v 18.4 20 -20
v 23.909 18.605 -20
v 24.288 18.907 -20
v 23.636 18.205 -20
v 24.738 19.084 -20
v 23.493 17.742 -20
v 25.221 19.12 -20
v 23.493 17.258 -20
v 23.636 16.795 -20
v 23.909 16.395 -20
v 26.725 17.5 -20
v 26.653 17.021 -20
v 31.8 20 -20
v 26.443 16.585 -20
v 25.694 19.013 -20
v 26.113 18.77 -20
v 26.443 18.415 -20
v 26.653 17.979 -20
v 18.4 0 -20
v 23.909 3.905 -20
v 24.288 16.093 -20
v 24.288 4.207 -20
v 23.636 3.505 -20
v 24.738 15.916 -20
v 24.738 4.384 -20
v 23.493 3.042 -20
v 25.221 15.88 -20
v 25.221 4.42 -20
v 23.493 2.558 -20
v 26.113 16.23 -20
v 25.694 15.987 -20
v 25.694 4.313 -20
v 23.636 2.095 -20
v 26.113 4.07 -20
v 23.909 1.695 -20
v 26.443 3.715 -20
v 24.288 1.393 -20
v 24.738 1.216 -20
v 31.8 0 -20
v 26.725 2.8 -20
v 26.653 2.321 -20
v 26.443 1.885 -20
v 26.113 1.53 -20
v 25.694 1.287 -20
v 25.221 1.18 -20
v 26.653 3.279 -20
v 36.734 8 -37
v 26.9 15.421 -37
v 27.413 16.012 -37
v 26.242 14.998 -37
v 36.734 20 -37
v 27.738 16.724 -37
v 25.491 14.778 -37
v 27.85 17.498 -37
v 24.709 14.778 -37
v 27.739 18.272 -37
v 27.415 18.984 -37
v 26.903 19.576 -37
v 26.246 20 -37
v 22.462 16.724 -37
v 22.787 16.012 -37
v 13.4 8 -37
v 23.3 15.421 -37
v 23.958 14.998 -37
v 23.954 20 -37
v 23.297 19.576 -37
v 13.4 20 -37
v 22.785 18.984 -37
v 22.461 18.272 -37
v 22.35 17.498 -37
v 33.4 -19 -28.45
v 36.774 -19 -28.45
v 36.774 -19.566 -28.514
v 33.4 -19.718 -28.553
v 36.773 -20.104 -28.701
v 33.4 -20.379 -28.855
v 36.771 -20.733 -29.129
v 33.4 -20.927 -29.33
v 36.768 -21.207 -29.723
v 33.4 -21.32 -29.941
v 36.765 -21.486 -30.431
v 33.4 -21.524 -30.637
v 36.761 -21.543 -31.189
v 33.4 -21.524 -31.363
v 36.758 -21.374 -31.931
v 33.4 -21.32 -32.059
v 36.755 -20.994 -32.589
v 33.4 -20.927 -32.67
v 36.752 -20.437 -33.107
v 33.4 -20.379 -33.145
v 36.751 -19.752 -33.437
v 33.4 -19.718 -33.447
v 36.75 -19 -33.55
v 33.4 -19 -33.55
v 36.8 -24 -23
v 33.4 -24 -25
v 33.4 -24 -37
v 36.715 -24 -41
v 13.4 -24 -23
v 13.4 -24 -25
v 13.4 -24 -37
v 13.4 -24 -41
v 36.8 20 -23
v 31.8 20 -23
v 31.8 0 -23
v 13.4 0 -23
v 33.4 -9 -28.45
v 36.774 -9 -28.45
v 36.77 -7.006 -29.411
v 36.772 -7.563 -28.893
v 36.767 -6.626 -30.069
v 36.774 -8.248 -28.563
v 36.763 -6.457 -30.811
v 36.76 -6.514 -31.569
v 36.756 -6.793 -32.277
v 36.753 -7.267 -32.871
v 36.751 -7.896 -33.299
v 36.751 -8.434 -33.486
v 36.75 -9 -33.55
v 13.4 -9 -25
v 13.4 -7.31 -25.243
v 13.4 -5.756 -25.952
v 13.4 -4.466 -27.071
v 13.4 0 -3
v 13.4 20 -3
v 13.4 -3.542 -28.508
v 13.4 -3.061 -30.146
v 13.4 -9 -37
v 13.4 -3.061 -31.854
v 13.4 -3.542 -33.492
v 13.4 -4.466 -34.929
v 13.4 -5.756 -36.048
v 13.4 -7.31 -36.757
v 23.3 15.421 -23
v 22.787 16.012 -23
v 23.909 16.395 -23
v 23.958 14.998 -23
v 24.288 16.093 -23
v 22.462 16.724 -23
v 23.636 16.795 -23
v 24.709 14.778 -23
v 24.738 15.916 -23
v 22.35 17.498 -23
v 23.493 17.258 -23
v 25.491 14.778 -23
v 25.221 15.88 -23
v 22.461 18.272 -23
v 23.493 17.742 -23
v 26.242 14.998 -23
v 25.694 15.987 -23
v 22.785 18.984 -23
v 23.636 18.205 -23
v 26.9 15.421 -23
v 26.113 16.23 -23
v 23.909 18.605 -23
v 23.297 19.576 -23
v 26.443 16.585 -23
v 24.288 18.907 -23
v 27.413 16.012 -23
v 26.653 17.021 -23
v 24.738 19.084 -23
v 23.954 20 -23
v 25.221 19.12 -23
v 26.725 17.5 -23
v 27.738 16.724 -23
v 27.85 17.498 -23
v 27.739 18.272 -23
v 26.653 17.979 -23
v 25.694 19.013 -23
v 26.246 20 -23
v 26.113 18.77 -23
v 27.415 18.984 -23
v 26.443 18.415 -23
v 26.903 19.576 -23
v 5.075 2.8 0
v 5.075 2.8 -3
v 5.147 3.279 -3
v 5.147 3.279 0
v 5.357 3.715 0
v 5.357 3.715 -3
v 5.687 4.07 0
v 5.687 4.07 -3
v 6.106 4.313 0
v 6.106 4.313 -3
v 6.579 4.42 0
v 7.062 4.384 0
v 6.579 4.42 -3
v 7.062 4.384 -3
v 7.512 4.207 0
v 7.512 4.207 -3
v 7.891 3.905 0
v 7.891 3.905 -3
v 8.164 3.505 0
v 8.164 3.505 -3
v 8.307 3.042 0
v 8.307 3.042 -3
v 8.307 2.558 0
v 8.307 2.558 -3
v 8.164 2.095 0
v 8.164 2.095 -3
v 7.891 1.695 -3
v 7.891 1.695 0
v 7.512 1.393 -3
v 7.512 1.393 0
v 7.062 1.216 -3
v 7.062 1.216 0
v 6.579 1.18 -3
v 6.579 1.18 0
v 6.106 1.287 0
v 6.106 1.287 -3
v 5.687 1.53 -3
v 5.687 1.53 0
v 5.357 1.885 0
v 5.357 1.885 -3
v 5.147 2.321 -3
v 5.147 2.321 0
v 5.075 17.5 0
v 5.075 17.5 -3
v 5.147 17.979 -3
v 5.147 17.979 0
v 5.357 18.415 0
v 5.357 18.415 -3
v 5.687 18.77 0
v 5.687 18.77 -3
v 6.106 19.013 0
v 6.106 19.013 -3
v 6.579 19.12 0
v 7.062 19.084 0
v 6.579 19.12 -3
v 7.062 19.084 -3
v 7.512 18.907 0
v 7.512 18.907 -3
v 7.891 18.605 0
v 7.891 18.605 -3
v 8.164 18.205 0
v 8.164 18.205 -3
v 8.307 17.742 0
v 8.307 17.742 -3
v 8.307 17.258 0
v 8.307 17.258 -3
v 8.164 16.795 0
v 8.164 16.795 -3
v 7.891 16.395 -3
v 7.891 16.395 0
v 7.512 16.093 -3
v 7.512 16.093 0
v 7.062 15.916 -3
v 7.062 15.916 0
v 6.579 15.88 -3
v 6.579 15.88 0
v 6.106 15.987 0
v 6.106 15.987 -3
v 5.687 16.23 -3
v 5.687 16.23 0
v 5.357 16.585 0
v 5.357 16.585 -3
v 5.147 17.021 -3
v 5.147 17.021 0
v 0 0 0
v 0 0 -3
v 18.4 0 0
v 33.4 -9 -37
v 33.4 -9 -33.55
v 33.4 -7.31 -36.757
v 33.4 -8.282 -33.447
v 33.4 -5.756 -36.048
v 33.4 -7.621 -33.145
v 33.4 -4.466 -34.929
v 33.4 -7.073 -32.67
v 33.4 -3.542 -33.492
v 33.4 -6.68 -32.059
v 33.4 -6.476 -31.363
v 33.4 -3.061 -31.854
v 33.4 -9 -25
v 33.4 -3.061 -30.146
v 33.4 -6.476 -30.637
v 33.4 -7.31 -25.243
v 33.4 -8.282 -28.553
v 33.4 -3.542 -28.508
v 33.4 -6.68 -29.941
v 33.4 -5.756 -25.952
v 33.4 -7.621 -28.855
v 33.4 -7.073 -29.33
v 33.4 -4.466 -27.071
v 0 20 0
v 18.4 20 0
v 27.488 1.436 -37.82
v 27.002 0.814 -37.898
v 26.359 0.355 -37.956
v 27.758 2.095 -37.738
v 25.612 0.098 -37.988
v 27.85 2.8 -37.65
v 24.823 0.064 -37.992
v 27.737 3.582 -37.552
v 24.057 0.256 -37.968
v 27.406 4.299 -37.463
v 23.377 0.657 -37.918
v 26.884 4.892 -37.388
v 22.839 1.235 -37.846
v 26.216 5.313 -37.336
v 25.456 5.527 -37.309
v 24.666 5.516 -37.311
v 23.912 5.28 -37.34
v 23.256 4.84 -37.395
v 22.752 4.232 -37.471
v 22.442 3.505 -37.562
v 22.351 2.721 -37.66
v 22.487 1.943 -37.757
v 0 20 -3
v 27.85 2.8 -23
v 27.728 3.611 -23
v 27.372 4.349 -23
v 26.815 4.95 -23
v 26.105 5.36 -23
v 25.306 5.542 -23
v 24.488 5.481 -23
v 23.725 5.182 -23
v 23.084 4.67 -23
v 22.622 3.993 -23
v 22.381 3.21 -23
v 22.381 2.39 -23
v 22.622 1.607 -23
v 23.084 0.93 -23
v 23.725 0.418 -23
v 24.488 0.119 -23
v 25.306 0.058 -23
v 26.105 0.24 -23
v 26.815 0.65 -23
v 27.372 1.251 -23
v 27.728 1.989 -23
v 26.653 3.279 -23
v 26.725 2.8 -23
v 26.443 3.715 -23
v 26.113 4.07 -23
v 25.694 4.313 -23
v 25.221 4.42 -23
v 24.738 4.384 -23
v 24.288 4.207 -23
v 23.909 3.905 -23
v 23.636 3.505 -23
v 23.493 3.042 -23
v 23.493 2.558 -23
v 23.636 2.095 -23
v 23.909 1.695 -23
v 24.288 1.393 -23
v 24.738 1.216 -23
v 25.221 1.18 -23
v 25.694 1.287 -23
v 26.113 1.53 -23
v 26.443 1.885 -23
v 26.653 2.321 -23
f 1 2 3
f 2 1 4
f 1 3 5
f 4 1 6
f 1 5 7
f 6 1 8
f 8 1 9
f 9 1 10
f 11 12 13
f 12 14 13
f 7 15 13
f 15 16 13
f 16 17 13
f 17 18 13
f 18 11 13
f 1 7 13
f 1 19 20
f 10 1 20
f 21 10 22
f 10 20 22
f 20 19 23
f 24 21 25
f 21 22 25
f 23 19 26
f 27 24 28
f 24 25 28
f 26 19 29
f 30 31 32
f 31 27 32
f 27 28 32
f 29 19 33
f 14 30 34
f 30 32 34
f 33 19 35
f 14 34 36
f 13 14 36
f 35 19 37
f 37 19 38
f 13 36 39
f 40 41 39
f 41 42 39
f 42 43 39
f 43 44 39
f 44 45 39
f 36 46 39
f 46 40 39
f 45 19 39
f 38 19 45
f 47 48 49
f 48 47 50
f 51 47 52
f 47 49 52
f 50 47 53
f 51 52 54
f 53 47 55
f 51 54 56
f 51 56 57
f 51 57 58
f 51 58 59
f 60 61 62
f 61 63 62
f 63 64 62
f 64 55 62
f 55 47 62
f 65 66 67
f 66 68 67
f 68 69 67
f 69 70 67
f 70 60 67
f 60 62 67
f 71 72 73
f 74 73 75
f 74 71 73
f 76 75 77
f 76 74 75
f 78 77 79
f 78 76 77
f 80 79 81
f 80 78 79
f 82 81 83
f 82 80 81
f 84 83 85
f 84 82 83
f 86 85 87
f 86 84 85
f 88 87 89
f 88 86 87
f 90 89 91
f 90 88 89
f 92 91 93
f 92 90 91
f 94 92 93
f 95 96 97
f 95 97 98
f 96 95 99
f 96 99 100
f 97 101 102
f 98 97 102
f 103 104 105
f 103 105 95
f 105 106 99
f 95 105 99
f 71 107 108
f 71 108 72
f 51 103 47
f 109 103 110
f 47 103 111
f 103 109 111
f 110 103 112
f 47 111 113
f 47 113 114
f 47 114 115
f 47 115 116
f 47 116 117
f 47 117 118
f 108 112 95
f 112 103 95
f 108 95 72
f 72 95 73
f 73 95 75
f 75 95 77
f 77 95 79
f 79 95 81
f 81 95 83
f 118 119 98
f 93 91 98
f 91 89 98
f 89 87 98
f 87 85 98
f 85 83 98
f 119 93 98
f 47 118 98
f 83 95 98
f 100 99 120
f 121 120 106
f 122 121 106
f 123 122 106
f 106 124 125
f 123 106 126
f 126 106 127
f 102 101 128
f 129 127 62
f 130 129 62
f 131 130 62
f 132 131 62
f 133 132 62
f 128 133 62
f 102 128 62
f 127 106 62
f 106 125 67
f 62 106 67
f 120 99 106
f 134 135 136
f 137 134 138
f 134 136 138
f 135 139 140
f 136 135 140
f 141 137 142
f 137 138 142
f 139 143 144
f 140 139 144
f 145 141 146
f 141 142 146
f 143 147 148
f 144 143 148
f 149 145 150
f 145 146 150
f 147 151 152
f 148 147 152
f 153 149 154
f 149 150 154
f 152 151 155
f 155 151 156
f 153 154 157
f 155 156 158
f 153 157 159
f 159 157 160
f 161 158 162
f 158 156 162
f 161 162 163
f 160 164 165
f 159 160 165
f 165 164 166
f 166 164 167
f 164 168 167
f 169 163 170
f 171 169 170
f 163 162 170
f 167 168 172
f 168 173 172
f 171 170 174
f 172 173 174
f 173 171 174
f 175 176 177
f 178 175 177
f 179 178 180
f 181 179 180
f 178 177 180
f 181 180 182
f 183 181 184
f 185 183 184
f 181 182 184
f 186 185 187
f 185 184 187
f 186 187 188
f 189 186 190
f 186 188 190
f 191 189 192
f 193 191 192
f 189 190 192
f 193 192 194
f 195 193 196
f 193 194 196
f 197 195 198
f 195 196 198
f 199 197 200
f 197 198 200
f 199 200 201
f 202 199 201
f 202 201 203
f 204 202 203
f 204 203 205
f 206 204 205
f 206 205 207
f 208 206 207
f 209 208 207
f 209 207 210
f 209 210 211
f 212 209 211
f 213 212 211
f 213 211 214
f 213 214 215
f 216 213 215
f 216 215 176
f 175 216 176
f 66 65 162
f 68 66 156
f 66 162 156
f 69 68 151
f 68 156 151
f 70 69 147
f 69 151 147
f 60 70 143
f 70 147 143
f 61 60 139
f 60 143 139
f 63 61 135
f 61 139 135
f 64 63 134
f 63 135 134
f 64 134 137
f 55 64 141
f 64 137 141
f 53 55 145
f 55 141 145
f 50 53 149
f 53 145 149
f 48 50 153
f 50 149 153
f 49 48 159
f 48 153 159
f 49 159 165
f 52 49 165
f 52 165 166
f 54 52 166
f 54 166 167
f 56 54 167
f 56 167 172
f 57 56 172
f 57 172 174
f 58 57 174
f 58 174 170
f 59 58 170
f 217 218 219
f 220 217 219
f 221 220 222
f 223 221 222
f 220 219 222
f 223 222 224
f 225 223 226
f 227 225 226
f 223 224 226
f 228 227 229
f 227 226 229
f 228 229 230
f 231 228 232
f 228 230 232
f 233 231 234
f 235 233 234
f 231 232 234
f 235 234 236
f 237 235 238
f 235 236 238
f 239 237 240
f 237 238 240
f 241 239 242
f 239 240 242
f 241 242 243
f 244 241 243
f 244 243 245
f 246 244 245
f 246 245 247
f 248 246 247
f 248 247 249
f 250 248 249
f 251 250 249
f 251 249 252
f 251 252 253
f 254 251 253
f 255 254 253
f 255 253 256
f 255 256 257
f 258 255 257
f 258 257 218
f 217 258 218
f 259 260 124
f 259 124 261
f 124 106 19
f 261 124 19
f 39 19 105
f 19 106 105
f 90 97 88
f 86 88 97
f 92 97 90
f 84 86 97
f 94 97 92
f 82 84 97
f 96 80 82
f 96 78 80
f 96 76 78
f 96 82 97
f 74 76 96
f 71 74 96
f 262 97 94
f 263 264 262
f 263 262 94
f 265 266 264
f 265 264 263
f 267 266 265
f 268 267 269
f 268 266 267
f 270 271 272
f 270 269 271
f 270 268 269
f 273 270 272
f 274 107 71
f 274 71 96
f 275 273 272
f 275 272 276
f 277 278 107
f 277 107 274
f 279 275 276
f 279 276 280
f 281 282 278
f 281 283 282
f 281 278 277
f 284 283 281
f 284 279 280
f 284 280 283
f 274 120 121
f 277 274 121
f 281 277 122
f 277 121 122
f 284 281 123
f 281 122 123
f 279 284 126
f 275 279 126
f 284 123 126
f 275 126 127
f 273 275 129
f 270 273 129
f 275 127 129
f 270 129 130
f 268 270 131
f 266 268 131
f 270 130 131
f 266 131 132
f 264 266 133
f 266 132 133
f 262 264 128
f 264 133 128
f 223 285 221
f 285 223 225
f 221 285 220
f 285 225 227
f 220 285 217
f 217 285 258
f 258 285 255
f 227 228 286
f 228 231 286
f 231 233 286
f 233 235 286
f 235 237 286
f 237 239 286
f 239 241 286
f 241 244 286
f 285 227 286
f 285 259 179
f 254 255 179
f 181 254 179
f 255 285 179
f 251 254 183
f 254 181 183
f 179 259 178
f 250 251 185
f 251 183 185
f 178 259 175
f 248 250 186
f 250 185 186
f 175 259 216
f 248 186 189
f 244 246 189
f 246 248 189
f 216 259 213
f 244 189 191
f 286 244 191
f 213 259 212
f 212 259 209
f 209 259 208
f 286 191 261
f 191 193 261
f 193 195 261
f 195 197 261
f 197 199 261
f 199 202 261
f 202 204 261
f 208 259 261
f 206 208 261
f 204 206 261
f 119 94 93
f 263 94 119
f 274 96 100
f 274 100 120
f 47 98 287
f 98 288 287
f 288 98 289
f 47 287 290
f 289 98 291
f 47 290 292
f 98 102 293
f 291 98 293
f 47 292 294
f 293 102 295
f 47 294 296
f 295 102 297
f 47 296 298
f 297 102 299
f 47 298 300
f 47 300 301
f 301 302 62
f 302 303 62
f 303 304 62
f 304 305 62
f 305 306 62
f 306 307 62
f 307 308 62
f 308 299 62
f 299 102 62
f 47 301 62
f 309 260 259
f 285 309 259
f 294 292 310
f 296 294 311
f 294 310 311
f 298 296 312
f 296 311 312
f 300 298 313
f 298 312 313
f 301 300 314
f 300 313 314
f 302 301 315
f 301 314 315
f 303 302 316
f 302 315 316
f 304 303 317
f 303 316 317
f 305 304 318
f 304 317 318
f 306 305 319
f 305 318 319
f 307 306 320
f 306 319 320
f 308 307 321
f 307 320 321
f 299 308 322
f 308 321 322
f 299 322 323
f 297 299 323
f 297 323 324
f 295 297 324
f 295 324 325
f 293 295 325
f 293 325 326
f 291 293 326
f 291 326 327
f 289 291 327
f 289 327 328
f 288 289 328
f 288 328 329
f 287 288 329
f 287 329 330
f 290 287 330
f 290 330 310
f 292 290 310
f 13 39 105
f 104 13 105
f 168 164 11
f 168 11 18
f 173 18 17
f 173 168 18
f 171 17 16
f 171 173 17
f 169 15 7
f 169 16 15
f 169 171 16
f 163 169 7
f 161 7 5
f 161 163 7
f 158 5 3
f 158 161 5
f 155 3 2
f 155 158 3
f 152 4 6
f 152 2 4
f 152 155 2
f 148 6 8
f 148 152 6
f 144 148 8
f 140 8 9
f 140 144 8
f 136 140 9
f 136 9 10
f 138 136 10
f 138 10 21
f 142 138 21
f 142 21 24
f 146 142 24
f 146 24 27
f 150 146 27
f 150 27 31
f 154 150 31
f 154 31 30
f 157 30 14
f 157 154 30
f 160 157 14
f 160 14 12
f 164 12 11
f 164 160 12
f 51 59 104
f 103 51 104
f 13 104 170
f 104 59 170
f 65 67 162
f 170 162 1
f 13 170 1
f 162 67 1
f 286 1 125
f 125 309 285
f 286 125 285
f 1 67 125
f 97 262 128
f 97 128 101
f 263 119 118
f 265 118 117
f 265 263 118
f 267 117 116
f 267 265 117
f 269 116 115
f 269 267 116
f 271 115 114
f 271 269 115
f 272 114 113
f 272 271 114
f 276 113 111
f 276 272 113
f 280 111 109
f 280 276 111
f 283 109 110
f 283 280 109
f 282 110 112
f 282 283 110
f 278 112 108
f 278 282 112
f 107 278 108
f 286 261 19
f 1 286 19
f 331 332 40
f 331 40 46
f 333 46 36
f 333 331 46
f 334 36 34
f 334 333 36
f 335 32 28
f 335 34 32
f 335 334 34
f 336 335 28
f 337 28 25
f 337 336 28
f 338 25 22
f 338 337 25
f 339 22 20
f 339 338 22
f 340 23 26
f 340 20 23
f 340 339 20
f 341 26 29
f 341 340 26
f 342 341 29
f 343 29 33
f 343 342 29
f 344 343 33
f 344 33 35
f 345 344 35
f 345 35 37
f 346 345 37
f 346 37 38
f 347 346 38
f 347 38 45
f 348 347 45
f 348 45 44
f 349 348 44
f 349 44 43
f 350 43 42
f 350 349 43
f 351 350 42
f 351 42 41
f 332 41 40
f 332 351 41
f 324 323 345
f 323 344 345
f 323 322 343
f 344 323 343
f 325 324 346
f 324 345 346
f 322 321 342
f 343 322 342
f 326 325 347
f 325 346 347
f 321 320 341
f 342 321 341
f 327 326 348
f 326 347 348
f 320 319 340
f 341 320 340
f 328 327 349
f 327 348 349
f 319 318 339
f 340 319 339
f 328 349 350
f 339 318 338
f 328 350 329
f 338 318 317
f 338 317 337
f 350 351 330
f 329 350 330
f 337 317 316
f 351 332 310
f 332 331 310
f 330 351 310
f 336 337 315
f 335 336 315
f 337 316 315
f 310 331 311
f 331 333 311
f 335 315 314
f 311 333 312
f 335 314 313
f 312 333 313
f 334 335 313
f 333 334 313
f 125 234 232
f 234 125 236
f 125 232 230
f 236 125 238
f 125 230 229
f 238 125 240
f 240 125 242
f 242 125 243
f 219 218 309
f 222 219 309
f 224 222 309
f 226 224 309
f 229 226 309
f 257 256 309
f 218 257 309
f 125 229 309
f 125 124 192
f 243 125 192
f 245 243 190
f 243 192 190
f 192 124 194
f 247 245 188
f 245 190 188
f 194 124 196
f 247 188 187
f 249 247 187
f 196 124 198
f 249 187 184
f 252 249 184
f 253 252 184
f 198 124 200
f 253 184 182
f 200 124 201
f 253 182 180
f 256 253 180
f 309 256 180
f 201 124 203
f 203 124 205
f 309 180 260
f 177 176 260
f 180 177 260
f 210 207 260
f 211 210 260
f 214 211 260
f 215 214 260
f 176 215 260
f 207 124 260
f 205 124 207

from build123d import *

# Parameters (mm, degrees)
BOSS_EXTRUDE1_DEPTH = 20
CUT_EXTRUDE1_START  = -4
SKETCH2_R           = 1.625
CUT_EXTRUDE1_DEPTH  = 25
BOSS_EXTRUDE2_DEPTH = 23.4
SKETCH5_R           = 2.75
CUT_EXTRUDE2_DEPTH  = 19
CUT_EXTRUDE3_DEPTH  = 45
CUT_EXTRUDE4_DEPTH  = 20


with BuildPart() as part:
    # Sketch1 → Boss-Extrude1 (new body)
    with BuildSketch(Plane(origin=(0, 0, 0), x_dir=(1, 0, 0), z_dir=(0, 1, 0))):
        Polygon((0, 0), (18.4, 0), (18.4, 20), (31.8, 20), (31.8, 23), (13.4, 23), (13.4, 3), (0, 3), align=None)
    extrude(amount=BOSS_EXTRUDE1_DEPTH)

    # Sketch2 → Cut-Extrude1 (cut)
    with BuildSketch(Plane.XY.offset(-20).offset(CUT_EXTRUDE1_START)):
        with Locations((25.1, 17.5)):
            Circle(SKETCH2_R)
        with Locations((25.1, 2.8)):
            Circle(SKETCH2_R)
    cut_extrude1 = extrude(amount=CUT_EXTRUDE1_DEPTH, mode=Mode.SUBTRACT)

    # Mirror1: Cut-Extrude1 across plane
    add(cut_extrude1.mirror(Plane.ZY.offset(-15.9)), mode=Mode.SUBTRACT)

    # Sketch3 → Boss-Extrude2 (add)
    with BuildSketch(Plane.ZY.offset(-13.4)):
        Polygon((-23, 20), (-23, -24), (-41, -24), (-37, 8), (-37, 20), align=None)
        with BuildLine():
            Line((-28.45, -9), (-28.45, -19))
            ThreePointArc((-28.45, -19), (-31, -21.55), (-33.55, -19))
            Line((-33.55, -19), (-33.55, -9))
            ThreePointArc((-33.55, -9), (-31, -6.45), (-28.45, -9))
        make_face(mode=Mode.SUBTRACT)
    extrude(amount=-BOSS_EXTRUDE2_DEPTH)

    # Sketch5 → Cut-Extrude2 (cut, through all)
    with BuildSketch(Plane.XY.offset(-23)):
        with Locations((25.1, 17.5)):
            Circle(SKETCH5_R)
        with Locations((25.1, 2.8)):
            Circle(SKETCH5_R)
    extrude(amount=-CUT_EXTRUDE2_DEPTH, mode=Mode.SUBTRACT)

    # Sketch4 → Cut-Extrude3 (cut, through all)
    with BuildSketch(Plane.XZ.offset(24)):
        Polygon((36.8, -23), (36.71517637, -41), (36.8, -41), align=None)
    extrude(amount=-CUT_EXTRUDE3_DEPTH, mode=Mode.SUBTRACT)

    # Sketch7 → Cut-Extrude4 (cut)
    with BuildSketch(Plane.ZY.offset(-13.4)):
        with BuildLine():
            Line((-37, -9), (-37, -24))
            Line((-37, -24), (-25, -24))
            Line((-25, -24), (-25, -9))
            ThreePointArc((-25, -9), (-31, -3), (-37, -9))
        make_face()
    extrude(amount=-CUT_EXTRUDE4_DEPTH, mode=Mode.SUBTRACT)


solid = part.part
